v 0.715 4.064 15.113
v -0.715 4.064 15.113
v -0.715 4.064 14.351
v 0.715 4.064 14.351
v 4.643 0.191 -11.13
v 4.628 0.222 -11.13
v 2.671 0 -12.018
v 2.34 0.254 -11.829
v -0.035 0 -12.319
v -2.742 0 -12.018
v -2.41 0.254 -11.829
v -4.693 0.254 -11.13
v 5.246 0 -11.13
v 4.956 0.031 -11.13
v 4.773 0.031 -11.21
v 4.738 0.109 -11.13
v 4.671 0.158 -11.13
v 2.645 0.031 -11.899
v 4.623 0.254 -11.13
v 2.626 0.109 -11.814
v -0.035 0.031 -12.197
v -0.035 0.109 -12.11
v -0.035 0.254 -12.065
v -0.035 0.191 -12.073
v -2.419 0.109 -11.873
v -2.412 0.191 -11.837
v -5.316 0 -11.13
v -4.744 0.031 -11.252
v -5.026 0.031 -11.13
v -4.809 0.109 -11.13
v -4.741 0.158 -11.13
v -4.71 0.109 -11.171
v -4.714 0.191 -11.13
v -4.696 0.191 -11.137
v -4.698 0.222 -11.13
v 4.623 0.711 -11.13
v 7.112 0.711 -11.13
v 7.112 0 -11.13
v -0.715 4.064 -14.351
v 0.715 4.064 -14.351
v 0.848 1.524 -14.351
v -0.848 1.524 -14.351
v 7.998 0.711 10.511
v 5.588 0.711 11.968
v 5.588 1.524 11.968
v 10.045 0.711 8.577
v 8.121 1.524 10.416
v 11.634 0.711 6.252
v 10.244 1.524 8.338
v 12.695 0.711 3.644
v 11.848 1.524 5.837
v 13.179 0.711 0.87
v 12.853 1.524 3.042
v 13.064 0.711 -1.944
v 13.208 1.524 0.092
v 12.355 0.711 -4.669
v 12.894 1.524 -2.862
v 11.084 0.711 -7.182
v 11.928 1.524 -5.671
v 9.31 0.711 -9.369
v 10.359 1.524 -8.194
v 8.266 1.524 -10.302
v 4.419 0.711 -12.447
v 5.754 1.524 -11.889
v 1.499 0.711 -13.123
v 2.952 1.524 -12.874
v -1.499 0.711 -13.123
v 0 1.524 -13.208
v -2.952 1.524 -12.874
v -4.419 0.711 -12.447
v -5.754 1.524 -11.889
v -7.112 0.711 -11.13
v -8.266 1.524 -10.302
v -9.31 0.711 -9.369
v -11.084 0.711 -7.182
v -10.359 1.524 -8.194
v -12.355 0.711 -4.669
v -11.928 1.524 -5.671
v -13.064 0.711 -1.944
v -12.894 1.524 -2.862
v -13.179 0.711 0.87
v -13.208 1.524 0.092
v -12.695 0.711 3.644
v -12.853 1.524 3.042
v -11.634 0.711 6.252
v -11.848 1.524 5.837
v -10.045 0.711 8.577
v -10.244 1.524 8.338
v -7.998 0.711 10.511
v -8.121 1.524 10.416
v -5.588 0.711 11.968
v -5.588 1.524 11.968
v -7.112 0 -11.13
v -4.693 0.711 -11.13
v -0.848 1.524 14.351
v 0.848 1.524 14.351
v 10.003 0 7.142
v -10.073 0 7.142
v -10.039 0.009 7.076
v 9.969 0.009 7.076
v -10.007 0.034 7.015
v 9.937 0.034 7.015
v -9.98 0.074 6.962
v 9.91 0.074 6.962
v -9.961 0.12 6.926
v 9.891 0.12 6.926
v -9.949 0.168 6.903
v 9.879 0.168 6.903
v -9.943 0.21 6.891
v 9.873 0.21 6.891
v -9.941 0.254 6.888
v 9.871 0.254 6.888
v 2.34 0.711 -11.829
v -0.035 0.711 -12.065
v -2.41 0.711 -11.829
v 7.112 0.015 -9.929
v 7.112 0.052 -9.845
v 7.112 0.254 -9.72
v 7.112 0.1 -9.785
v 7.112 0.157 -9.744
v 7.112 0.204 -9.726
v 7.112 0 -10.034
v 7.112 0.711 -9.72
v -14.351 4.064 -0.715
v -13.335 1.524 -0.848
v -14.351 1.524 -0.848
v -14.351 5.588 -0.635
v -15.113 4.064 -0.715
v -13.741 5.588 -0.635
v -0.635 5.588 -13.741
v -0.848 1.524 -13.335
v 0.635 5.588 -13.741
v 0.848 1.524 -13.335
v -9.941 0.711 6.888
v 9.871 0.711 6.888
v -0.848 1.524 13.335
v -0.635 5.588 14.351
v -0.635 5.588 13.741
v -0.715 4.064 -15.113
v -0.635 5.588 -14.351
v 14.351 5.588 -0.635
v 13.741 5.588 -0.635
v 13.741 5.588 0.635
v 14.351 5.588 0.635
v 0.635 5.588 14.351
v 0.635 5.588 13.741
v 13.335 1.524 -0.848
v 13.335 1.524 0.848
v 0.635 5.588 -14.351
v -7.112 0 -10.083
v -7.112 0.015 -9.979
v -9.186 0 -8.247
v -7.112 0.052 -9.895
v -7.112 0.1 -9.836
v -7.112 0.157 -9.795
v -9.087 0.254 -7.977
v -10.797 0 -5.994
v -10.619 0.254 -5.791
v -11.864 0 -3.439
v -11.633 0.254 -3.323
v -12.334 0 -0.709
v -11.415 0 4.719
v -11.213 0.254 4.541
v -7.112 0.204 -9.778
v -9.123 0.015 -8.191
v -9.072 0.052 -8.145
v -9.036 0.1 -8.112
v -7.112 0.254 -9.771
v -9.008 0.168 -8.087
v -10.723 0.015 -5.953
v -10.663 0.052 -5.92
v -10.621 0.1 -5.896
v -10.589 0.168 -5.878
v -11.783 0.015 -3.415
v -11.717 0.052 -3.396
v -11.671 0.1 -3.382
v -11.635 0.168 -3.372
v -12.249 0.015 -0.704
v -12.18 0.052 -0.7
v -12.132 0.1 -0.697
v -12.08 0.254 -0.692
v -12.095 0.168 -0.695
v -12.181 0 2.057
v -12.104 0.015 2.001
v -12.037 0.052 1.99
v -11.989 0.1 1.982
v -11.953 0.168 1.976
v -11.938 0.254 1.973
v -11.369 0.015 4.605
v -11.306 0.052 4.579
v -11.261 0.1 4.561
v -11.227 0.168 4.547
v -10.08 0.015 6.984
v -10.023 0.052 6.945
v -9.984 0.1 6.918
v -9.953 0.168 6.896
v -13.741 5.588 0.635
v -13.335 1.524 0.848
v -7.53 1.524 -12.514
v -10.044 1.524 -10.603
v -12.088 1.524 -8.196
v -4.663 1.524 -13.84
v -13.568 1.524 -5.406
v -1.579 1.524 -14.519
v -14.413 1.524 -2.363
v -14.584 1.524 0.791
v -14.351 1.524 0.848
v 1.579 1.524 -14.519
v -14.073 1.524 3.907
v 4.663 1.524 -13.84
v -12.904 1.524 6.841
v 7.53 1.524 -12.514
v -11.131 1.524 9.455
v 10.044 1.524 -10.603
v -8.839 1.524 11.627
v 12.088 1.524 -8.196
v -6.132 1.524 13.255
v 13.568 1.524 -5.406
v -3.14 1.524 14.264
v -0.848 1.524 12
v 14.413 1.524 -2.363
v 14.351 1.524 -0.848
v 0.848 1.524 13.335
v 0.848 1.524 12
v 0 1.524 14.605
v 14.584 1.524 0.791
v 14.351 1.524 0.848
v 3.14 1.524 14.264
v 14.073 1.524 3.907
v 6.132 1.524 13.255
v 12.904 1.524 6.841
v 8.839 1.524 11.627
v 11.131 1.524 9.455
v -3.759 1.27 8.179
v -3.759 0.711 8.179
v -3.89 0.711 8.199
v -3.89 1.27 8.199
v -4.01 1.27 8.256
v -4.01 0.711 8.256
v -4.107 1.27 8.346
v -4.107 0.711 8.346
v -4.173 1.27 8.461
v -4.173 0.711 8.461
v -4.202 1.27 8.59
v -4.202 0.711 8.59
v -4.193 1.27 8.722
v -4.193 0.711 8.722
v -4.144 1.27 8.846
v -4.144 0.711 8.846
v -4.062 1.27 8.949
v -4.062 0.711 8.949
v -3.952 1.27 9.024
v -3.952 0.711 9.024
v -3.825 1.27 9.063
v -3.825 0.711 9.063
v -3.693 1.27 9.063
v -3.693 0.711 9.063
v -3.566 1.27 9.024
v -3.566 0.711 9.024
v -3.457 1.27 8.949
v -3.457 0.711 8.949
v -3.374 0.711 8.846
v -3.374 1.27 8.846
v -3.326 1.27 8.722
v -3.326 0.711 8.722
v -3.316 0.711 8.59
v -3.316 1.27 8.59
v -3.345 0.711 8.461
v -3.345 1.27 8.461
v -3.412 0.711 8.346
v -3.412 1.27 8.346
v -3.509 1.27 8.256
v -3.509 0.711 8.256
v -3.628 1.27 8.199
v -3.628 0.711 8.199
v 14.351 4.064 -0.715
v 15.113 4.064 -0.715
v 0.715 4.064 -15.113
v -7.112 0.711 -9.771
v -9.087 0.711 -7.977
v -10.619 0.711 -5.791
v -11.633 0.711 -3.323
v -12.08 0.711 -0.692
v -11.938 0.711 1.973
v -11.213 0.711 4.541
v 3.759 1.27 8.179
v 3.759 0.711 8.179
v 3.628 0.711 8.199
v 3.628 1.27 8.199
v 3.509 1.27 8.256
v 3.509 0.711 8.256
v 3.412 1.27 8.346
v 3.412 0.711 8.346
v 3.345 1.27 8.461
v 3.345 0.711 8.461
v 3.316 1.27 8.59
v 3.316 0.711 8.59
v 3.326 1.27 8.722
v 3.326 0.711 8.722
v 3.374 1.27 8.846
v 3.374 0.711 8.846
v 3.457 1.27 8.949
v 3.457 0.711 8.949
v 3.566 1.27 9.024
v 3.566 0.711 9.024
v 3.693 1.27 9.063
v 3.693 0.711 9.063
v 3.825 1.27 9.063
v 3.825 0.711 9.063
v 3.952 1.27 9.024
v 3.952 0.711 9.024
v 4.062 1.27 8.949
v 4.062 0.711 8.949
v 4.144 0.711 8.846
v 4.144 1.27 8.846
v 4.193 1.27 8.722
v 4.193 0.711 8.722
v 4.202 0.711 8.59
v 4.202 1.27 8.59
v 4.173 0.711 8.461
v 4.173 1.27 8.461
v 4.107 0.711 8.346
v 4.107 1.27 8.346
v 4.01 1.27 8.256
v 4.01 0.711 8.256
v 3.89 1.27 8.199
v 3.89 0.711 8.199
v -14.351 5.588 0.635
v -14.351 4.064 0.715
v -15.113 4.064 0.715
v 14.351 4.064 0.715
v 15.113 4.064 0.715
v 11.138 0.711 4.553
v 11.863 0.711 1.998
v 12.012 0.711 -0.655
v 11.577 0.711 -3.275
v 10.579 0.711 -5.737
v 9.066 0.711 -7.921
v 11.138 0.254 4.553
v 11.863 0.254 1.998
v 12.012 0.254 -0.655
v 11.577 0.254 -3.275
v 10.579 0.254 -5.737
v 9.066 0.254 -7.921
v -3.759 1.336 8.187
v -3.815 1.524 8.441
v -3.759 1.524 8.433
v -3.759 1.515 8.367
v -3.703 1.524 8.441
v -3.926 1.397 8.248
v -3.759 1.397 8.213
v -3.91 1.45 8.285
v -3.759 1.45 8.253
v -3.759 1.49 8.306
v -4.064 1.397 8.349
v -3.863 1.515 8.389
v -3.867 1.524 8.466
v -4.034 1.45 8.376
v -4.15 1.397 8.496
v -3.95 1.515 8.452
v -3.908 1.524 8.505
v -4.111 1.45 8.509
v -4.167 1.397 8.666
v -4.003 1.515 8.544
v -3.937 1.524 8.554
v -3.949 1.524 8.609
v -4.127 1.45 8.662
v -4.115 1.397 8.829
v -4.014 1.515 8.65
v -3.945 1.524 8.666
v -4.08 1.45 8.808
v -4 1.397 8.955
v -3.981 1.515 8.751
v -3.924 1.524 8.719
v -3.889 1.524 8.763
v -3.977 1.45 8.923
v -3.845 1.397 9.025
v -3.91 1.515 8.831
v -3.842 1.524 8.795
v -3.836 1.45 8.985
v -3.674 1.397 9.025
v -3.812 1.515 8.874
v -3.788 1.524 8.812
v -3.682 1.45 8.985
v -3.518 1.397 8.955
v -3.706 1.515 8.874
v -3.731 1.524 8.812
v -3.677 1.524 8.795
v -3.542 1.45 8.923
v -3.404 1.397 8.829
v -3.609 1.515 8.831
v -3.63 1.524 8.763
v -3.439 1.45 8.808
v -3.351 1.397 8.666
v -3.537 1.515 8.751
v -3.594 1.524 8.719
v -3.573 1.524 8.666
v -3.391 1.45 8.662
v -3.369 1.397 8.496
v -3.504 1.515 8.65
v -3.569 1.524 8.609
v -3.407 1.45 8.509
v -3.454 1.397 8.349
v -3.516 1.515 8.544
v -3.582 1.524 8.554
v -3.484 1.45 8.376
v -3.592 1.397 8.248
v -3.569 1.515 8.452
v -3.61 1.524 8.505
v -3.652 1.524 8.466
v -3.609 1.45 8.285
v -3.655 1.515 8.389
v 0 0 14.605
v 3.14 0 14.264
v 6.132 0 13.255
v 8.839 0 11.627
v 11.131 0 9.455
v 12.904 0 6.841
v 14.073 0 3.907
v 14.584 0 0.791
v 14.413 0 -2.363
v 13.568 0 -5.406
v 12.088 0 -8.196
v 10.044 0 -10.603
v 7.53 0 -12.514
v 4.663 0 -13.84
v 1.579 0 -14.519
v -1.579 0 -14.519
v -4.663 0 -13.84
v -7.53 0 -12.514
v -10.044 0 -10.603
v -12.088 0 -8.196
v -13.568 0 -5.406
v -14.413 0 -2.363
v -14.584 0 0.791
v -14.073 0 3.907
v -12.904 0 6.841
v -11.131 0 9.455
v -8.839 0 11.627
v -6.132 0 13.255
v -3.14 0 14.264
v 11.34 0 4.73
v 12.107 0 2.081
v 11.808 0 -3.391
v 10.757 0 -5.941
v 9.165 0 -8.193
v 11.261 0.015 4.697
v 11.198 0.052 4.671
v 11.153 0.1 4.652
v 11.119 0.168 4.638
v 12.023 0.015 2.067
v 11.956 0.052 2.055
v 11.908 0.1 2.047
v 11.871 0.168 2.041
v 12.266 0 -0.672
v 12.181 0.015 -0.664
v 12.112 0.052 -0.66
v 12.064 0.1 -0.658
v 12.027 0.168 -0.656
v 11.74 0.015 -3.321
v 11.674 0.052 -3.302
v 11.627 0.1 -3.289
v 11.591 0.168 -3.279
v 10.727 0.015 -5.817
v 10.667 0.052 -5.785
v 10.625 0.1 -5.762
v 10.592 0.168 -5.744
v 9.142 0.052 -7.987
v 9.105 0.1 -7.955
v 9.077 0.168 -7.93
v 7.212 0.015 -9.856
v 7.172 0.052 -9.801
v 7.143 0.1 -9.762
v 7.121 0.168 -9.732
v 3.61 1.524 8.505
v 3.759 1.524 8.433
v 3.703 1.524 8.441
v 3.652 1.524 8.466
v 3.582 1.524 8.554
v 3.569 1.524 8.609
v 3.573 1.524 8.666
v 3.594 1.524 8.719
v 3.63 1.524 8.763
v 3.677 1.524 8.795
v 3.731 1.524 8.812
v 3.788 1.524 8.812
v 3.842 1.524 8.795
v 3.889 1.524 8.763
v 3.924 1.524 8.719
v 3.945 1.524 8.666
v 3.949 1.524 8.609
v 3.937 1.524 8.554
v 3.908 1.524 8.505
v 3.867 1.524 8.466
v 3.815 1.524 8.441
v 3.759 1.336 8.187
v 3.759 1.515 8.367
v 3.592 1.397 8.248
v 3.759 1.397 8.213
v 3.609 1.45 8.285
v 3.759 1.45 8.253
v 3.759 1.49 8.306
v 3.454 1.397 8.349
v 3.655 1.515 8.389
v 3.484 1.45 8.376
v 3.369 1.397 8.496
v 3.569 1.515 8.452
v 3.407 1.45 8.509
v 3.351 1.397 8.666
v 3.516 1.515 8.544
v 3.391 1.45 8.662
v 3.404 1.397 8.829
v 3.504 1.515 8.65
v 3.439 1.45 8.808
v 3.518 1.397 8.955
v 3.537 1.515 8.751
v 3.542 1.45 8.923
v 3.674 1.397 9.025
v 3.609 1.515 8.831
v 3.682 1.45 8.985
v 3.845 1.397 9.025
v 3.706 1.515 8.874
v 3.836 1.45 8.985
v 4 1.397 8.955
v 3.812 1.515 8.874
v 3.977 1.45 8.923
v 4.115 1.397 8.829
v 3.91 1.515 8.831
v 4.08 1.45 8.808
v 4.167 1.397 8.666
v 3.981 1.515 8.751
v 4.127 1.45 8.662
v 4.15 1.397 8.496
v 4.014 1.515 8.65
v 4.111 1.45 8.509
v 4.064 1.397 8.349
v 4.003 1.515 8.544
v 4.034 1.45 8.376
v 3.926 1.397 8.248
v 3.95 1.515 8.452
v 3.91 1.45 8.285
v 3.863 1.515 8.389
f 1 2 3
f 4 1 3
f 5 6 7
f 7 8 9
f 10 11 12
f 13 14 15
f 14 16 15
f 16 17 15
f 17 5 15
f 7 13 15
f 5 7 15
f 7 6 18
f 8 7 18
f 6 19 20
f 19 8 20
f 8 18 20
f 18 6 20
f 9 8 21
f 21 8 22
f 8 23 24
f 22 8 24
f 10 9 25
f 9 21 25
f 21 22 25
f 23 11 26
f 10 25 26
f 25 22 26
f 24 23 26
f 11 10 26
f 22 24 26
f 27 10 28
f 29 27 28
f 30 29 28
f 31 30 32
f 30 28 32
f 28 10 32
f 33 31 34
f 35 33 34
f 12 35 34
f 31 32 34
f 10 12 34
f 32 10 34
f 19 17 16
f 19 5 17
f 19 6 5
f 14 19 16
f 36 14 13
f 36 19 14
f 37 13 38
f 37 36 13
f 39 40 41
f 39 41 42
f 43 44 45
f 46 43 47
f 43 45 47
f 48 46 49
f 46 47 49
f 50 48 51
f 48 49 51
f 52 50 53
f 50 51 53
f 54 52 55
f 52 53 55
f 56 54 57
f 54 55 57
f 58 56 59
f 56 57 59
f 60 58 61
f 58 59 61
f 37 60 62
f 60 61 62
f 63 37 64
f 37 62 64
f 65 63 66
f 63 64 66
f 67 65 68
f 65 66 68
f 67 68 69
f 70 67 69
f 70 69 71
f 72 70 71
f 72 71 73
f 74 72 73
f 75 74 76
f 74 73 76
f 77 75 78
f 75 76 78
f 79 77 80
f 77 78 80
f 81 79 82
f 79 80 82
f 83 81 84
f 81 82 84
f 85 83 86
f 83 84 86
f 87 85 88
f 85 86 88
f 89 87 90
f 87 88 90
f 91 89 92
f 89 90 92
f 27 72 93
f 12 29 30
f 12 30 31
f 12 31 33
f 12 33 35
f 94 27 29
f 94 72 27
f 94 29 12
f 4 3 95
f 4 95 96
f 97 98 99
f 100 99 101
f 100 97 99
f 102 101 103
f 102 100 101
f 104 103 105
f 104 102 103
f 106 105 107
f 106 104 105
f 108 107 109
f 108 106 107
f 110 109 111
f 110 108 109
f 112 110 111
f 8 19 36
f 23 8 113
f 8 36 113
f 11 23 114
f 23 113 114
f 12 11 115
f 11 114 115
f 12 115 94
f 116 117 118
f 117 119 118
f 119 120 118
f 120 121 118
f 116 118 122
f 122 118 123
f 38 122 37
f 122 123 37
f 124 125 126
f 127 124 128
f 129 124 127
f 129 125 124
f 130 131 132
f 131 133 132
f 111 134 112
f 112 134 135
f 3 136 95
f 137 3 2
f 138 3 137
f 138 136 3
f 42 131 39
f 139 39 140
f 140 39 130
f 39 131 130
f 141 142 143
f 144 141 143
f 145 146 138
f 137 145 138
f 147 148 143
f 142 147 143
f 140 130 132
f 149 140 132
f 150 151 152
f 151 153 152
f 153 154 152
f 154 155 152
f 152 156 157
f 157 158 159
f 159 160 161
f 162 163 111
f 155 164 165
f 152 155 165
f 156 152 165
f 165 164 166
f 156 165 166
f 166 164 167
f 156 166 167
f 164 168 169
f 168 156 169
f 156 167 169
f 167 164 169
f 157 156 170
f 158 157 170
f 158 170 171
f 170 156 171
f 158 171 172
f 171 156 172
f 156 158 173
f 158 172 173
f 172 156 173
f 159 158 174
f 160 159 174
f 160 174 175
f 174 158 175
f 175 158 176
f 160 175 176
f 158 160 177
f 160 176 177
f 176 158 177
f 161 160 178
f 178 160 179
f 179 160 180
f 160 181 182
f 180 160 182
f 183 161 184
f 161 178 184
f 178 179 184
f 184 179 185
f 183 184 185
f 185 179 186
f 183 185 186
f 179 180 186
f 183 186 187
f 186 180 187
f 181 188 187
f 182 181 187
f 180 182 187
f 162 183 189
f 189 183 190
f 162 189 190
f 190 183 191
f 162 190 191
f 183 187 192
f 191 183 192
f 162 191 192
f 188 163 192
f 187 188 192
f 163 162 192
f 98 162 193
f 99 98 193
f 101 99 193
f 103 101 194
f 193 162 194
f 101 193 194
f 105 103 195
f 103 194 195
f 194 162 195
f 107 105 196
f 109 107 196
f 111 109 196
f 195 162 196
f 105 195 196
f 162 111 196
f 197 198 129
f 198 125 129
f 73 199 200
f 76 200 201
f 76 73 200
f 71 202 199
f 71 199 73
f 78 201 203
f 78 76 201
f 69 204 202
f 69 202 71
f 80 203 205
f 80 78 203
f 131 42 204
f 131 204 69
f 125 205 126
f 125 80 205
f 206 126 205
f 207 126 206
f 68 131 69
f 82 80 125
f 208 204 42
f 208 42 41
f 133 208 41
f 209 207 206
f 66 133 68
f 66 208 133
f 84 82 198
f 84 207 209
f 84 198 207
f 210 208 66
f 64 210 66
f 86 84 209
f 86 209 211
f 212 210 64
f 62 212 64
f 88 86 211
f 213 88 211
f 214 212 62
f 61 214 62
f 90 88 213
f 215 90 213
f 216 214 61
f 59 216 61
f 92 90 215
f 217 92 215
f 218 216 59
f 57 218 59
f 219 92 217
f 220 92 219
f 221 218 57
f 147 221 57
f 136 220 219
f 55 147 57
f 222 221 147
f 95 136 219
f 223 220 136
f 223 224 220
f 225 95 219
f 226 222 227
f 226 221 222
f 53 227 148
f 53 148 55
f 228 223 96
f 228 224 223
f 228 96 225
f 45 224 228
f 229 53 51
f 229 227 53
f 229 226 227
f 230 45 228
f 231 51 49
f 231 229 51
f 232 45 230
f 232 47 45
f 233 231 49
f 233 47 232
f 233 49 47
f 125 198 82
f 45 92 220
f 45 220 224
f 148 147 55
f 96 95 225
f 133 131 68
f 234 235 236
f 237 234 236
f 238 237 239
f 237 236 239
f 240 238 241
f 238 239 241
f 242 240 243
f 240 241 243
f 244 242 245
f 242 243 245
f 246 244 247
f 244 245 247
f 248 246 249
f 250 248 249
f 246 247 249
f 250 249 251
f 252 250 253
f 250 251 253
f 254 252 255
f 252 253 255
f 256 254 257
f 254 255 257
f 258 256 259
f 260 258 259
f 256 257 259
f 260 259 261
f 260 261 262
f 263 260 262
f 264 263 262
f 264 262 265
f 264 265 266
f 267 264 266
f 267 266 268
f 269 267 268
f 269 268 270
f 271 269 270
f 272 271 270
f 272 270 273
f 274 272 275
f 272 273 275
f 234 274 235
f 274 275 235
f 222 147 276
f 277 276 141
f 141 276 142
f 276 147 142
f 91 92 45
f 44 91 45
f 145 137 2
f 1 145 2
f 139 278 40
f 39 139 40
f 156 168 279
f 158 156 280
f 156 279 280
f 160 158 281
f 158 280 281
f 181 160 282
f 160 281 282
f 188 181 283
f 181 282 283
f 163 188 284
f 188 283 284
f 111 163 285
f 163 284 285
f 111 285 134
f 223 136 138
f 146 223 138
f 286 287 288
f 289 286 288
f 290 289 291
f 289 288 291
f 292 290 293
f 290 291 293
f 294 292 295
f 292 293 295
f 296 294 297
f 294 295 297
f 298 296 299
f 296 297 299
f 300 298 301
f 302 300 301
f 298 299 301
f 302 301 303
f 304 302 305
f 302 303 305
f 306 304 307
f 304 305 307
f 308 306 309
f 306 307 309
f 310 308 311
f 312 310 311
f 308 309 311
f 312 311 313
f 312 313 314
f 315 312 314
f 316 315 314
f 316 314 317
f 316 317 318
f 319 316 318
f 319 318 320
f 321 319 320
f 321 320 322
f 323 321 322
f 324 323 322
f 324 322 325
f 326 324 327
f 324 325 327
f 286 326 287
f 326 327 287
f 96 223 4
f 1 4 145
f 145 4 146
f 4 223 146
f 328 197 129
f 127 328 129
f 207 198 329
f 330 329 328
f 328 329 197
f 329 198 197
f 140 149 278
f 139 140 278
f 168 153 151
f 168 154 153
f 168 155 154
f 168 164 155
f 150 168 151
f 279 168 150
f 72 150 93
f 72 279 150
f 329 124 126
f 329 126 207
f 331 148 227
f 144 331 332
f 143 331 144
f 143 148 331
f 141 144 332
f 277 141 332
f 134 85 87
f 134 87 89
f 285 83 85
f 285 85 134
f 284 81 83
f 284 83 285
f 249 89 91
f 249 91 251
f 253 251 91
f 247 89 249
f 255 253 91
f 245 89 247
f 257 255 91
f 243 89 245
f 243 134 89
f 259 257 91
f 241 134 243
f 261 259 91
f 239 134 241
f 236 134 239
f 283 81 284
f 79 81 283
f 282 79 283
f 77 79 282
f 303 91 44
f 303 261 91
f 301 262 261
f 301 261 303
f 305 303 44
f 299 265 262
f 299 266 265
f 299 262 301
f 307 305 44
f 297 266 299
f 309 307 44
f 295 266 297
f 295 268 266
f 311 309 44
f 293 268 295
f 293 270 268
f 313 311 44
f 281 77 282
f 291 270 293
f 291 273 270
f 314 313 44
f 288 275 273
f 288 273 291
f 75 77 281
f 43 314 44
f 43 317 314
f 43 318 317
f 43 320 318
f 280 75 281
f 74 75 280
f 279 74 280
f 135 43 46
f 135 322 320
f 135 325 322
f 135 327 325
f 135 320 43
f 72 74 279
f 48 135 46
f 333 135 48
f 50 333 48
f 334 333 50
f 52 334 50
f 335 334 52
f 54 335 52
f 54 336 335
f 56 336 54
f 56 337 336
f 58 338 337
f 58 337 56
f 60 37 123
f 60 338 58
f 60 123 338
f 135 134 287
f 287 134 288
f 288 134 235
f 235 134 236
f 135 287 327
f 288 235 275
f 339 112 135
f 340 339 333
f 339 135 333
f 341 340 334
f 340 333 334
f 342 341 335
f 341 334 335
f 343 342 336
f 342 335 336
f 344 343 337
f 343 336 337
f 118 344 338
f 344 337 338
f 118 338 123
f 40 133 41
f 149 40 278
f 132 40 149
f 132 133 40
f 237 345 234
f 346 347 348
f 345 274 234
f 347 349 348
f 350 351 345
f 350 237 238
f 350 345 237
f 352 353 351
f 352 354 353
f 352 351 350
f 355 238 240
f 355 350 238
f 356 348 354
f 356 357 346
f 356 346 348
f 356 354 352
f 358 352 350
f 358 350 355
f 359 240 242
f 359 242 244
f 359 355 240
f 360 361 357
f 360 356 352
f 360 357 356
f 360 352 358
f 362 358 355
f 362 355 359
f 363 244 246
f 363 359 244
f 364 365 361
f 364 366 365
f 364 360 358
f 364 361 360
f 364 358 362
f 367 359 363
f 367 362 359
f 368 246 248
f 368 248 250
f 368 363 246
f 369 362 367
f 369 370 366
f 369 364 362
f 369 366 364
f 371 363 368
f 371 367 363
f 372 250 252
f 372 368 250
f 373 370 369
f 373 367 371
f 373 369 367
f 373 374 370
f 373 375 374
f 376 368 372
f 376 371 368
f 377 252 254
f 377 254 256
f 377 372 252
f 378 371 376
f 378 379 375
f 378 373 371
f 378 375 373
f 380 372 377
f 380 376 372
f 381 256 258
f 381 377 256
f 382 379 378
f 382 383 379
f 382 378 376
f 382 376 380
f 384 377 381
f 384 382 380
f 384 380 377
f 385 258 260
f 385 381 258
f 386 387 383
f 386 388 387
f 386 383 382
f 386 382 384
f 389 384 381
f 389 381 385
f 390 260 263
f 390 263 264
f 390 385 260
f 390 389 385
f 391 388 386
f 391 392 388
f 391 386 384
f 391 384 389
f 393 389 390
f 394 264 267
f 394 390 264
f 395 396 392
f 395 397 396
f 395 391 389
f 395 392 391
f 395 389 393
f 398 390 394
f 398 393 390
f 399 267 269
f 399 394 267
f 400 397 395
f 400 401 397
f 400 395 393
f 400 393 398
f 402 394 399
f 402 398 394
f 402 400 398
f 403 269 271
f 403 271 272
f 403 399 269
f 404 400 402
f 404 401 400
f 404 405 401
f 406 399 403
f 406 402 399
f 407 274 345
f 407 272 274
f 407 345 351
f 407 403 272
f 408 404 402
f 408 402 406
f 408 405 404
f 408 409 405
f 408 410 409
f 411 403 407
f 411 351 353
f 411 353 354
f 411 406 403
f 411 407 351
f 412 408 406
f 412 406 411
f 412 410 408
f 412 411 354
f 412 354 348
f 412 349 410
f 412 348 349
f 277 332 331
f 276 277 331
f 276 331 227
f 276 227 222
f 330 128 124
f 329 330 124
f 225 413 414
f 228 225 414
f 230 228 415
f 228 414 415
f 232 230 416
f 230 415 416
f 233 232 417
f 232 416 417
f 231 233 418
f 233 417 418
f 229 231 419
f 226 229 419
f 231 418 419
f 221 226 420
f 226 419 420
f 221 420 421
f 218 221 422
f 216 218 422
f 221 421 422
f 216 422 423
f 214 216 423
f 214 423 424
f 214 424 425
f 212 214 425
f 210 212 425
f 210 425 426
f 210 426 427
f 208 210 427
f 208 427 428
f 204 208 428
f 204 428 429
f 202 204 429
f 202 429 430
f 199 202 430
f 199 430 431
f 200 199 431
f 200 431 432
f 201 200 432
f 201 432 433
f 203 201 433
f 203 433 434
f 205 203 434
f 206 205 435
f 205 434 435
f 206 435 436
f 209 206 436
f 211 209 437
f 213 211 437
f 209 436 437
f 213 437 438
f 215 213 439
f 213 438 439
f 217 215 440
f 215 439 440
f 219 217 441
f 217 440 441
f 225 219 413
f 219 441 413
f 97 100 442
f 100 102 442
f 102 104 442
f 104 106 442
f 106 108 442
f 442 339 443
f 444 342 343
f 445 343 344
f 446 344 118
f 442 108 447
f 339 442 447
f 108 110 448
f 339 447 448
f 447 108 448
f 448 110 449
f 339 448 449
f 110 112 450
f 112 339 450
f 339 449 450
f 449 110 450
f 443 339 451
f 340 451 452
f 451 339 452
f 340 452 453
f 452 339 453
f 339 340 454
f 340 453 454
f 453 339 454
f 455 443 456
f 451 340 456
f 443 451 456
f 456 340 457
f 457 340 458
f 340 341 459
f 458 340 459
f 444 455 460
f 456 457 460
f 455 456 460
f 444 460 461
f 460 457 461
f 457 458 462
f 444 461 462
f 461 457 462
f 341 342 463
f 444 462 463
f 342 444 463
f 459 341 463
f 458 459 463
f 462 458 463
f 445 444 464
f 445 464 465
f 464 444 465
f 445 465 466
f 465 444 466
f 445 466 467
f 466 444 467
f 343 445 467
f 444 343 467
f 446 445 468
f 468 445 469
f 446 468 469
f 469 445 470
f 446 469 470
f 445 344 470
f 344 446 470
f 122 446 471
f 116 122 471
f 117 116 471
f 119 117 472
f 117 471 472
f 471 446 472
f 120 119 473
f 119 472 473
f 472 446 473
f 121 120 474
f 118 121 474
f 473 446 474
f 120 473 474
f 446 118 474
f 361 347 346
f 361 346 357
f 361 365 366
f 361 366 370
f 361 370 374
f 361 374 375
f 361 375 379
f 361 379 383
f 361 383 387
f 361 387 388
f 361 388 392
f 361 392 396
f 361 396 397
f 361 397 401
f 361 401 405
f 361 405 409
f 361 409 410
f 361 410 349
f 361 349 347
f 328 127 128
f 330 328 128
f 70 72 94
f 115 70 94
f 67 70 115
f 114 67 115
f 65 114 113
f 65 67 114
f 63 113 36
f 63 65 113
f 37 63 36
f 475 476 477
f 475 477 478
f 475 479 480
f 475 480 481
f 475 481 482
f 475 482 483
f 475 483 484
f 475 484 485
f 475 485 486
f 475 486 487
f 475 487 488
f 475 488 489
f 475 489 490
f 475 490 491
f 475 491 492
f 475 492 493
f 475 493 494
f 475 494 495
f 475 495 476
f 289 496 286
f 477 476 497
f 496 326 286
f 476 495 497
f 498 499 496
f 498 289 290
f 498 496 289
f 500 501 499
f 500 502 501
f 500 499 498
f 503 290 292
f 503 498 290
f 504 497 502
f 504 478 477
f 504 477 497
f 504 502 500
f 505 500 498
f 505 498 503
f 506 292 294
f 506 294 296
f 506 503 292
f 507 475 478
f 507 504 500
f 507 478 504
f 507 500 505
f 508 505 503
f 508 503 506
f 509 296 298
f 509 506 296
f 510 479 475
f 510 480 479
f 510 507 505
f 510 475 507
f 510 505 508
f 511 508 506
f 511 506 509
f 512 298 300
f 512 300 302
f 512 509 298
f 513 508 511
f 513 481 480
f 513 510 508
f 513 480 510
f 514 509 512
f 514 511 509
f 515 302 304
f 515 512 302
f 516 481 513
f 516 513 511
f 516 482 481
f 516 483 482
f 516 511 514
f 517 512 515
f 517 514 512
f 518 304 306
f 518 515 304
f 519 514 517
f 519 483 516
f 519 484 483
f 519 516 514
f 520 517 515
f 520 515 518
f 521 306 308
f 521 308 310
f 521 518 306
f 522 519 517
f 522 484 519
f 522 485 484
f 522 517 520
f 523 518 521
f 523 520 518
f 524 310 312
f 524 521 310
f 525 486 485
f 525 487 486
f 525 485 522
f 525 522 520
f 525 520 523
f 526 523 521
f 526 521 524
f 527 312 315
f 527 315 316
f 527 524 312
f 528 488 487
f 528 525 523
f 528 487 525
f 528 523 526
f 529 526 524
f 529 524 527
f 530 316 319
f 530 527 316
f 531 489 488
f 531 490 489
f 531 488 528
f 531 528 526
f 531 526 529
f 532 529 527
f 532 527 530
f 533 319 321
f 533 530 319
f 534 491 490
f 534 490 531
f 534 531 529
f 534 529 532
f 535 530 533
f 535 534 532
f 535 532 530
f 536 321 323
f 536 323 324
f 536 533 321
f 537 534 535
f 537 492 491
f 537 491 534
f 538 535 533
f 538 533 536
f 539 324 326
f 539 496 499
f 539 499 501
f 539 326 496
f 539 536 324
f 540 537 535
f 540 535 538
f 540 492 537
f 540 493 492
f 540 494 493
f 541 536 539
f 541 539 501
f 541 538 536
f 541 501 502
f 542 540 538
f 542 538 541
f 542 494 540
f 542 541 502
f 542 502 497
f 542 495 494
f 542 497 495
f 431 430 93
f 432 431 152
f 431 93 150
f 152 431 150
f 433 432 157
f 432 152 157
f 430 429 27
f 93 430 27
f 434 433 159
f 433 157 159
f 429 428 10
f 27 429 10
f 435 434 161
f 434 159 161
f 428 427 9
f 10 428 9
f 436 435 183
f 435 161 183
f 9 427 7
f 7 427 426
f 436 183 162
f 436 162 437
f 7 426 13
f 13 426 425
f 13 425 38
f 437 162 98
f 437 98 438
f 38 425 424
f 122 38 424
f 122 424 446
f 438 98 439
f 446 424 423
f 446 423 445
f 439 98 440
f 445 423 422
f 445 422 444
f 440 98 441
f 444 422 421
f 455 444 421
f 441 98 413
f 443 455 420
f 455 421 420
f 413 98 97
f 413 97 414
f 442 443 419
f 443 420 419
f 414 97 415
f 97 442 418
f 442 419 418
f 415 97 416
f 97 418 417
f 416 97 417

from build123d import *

# Parameters (mm, degrees)
SKETCH1_R           = 14.605
BOSS_EXTRUDE1_DEPTH = 1.524
CUT_EXTRUDE1_DEPTH  = 0.8128
SKETCH4_R           = 0.4445
BOSS_EXTRUDE2_DEPTH = 0.8128
CUT_EXTRUDE2_DEPTH  = 21.670575557
FILLET1_R           = 0.254
FILLET3_R           = 0.254
SNAP_START          = 13.7414
SNAP_HOOK1_DEPTH    = 0.6096
SNAP_START_2        = -0.714869456
SNAP_HOOK1_2_DEPTH  = 1.429738912
SNAP_START_3        = -0.847985215
SNAP_HOOK1_3_DEPTH  = 1.69597043
SNAP_START_4        = 12
SNAP_HOOK1_4_DEPTH  = 4
CIRPATTERN1_COUNT   = 4
SKETCH6_W           = 14.224
SKETCH6_H           = 9.208016637
CUT_EXTRUDE3_DEPTH  = 2.54


with BuildPart() as part:
    # Sketch1 → Boss-Extrude1 (new body)
    with BuildSketch(Plane(origin=(0, 0, 0), x_dir=(1, 0, 0), z_dir=(0, 1, 0))):
        with Locations(Location((0, 0, 0), (0, 0, 270))):
            Circle(SKETCH1_R)
    extrude(amount=BOSS_EXTRUDE1_DEPTH)

    # Sketch3 → Cut-Extrude1 (cut)
    with BuildSketch(Plane(origin=(0, 1.524, 0), x_dir=(1, 0, 0), z_dir=(0, 1, 0))):
        with BuildLine():
            Line((-5.588, -11.967686493), (5.588, -11.967686493))
            ThreePointArc((5.588, -11.967686493), (0, 13.208), (-5.588, -11.967686493))
        make_face()
    extrude(amount=-CUT_EXTRUDE1_DEPTH, mode=Mode.SUBTRACT)

    # Sketch4 → Boss-Extrude2 (add)
    with BuildSketch(Plane(origin=(0, 0.7112, 0), x_dir=(1, 0, 0), z_dir=(0, 1, 0))):
        with Locations(Location((-3.7592, -8.6233, 0), (0, 0, 90))):
            Circle(SKETCH4_R)
        with Locations(Location((3.7592, -8.6233, 0), (0, 0, 90))):
            Circle(SKETCH4_R)
    extrude(amount=BOSS_EXTRUDE2_DEPTH)

    # Sketch5 → Cut-Extrude2 (cut, through all)
    with BuildSketch(Plane(origin=(0, 0.7112, 0), x_dir=(1, 0, 0), z_dir=(0, 1, 0))):
        with BuildLine():
            Line((-9.940854815, -6.887686493), (9.870656967, -6.887686493))
            ThreePointArc((9.870656967, -6.887686493), (-0.035098924, 12.065), (-9.940854815, -6.887686493))
        make_face()
    extrude(amount=-CUT_EXTRUDE2_DEPTH, mode=Mode.SUBTRACT)

    # Fillet1
    fillet1_edges = [part.edges().sort_by_distance(p)[0] for p in [
        (-0.035098924, 0, -12.065),
        (-0.035098924, 0, 6.887686493),
    ]]
    fillet(fillet1_edges, radius=FILLET1_R)

    # Fillet3
    fillet3_edges = [part.edges().sort_by_distance(p)[0] for p in [
        (-3.7592, 1.524, 9.0678),
        (3.7592, 1.524, 9.0678),
    ]]
    fillet(fillet3_edges, radius=FILLET3_R)

    # Snap Hook1: read off the stored shape, not the designer's step
    # Snap Hook1 outline → Snap Hook1 (add)
    with BuildSketch(Plane.XY.offset(SNAP_START)):
        Polygon((-0.847985215, 1.524), (0.847985215, 1.524), (0.635, 5.588), (-0.635, 5.588), align=None)
    snap_hook1 = extrude(amount=SNAP_HOOK1_DEPTH)

    # Snap Hook1 2 outline → Snap Hook1 2 (add)
    with BuildSketch(Plane.YZ.offset(SNAP_START_2)):
        Polygon((1.524, 13.7414), (1.524, 13.335), (5.588, 13.7414), align=None)
        Polygon((4.064, 15.113), (4.064, 14.351), (5.588, 14.351), align=None)
    snap_hook1_2 = extrude(amount=SNAP_HOOK1_2_DEPTH)

    # Snap Hook1 3 outline → Snap Hook1 3 (add)
    with BuildSketch(Plane.YZ.offset(SNAP_START_3)):
        Polygon((1.524, 13.7414), (1.524, 13.335), (5.588, 13.7414), align=None)
    snap_hook1_3 = extrude(amount=SNAP_HOOK1_3_DEPTH)

    # Snap Hook1 4 outline → Snap Hook1 4 (cut)
    with BuildSketch(Plane.XY.offset(SNAP_START_4)):
        Polygon((0.847985215, 1.524), (0.847985215, 7), (0.561000216, 7), (0.635, 5.588), align=None)
        Polygon((-0.635, 5.588), (-0.561000216, 7), (-0.847985215, 7), (-0.847985215, 1.524), align=None)
    snap_hook1_4 = extrude(amount=SNAP_HOOK1_4_DEPTH, mode=Mode.SUBTRACT)

    # CirPattern1: Snap Hook1, Snap Hook1 2, Snap Hook1 3, Snap Hook1 4 ×4 about axis
    cirpattern1_axis = Axis((0, 1.524, 0), (0, 1, 0))
    add([snap_hook1.rotate(cirpattern1_axis, i * 360 / CIRPATTERN1_COUNT) for i in range(1, CIRPATTERN1_COUNT)])
    add([snap_hook1_2.rotate(cirpattern1_axis, i * 360 / CIRPATTERN1_COUNT) for i in range(1, CIRPATTERN1_COUNT)])
    add([snap_hook1_3.rotate(cirpattern1_axis, i * 360 / CIRPATTERN1_COUNT) for i in range(1, CIRPATTERN1_COUNT)])
    add([snap_hook1_4.rotate(cirpattern1_axis, i * 360 / CIRPATTERN1_COUNT) for i in range(1, CIRPATTERN1_COUNT)], mode=Mode.SUBTRACT)

    # Sketch6 → Cut-Extrude3 (cut)
    with BuildSketch(Plane(origin=(0, 0.7112, 0), x_dir=(1, 0, 0), z_dir=(0, 1, 0))):
        with Locations((0, 6.525714051)):
            Rectangle(SKETCH6_W, SKETCH6_H)
    extrude(amount=-CUT_EXTRUDE3_DEPTH, mode=Mode.SUBTRACT)


solid = part.part
